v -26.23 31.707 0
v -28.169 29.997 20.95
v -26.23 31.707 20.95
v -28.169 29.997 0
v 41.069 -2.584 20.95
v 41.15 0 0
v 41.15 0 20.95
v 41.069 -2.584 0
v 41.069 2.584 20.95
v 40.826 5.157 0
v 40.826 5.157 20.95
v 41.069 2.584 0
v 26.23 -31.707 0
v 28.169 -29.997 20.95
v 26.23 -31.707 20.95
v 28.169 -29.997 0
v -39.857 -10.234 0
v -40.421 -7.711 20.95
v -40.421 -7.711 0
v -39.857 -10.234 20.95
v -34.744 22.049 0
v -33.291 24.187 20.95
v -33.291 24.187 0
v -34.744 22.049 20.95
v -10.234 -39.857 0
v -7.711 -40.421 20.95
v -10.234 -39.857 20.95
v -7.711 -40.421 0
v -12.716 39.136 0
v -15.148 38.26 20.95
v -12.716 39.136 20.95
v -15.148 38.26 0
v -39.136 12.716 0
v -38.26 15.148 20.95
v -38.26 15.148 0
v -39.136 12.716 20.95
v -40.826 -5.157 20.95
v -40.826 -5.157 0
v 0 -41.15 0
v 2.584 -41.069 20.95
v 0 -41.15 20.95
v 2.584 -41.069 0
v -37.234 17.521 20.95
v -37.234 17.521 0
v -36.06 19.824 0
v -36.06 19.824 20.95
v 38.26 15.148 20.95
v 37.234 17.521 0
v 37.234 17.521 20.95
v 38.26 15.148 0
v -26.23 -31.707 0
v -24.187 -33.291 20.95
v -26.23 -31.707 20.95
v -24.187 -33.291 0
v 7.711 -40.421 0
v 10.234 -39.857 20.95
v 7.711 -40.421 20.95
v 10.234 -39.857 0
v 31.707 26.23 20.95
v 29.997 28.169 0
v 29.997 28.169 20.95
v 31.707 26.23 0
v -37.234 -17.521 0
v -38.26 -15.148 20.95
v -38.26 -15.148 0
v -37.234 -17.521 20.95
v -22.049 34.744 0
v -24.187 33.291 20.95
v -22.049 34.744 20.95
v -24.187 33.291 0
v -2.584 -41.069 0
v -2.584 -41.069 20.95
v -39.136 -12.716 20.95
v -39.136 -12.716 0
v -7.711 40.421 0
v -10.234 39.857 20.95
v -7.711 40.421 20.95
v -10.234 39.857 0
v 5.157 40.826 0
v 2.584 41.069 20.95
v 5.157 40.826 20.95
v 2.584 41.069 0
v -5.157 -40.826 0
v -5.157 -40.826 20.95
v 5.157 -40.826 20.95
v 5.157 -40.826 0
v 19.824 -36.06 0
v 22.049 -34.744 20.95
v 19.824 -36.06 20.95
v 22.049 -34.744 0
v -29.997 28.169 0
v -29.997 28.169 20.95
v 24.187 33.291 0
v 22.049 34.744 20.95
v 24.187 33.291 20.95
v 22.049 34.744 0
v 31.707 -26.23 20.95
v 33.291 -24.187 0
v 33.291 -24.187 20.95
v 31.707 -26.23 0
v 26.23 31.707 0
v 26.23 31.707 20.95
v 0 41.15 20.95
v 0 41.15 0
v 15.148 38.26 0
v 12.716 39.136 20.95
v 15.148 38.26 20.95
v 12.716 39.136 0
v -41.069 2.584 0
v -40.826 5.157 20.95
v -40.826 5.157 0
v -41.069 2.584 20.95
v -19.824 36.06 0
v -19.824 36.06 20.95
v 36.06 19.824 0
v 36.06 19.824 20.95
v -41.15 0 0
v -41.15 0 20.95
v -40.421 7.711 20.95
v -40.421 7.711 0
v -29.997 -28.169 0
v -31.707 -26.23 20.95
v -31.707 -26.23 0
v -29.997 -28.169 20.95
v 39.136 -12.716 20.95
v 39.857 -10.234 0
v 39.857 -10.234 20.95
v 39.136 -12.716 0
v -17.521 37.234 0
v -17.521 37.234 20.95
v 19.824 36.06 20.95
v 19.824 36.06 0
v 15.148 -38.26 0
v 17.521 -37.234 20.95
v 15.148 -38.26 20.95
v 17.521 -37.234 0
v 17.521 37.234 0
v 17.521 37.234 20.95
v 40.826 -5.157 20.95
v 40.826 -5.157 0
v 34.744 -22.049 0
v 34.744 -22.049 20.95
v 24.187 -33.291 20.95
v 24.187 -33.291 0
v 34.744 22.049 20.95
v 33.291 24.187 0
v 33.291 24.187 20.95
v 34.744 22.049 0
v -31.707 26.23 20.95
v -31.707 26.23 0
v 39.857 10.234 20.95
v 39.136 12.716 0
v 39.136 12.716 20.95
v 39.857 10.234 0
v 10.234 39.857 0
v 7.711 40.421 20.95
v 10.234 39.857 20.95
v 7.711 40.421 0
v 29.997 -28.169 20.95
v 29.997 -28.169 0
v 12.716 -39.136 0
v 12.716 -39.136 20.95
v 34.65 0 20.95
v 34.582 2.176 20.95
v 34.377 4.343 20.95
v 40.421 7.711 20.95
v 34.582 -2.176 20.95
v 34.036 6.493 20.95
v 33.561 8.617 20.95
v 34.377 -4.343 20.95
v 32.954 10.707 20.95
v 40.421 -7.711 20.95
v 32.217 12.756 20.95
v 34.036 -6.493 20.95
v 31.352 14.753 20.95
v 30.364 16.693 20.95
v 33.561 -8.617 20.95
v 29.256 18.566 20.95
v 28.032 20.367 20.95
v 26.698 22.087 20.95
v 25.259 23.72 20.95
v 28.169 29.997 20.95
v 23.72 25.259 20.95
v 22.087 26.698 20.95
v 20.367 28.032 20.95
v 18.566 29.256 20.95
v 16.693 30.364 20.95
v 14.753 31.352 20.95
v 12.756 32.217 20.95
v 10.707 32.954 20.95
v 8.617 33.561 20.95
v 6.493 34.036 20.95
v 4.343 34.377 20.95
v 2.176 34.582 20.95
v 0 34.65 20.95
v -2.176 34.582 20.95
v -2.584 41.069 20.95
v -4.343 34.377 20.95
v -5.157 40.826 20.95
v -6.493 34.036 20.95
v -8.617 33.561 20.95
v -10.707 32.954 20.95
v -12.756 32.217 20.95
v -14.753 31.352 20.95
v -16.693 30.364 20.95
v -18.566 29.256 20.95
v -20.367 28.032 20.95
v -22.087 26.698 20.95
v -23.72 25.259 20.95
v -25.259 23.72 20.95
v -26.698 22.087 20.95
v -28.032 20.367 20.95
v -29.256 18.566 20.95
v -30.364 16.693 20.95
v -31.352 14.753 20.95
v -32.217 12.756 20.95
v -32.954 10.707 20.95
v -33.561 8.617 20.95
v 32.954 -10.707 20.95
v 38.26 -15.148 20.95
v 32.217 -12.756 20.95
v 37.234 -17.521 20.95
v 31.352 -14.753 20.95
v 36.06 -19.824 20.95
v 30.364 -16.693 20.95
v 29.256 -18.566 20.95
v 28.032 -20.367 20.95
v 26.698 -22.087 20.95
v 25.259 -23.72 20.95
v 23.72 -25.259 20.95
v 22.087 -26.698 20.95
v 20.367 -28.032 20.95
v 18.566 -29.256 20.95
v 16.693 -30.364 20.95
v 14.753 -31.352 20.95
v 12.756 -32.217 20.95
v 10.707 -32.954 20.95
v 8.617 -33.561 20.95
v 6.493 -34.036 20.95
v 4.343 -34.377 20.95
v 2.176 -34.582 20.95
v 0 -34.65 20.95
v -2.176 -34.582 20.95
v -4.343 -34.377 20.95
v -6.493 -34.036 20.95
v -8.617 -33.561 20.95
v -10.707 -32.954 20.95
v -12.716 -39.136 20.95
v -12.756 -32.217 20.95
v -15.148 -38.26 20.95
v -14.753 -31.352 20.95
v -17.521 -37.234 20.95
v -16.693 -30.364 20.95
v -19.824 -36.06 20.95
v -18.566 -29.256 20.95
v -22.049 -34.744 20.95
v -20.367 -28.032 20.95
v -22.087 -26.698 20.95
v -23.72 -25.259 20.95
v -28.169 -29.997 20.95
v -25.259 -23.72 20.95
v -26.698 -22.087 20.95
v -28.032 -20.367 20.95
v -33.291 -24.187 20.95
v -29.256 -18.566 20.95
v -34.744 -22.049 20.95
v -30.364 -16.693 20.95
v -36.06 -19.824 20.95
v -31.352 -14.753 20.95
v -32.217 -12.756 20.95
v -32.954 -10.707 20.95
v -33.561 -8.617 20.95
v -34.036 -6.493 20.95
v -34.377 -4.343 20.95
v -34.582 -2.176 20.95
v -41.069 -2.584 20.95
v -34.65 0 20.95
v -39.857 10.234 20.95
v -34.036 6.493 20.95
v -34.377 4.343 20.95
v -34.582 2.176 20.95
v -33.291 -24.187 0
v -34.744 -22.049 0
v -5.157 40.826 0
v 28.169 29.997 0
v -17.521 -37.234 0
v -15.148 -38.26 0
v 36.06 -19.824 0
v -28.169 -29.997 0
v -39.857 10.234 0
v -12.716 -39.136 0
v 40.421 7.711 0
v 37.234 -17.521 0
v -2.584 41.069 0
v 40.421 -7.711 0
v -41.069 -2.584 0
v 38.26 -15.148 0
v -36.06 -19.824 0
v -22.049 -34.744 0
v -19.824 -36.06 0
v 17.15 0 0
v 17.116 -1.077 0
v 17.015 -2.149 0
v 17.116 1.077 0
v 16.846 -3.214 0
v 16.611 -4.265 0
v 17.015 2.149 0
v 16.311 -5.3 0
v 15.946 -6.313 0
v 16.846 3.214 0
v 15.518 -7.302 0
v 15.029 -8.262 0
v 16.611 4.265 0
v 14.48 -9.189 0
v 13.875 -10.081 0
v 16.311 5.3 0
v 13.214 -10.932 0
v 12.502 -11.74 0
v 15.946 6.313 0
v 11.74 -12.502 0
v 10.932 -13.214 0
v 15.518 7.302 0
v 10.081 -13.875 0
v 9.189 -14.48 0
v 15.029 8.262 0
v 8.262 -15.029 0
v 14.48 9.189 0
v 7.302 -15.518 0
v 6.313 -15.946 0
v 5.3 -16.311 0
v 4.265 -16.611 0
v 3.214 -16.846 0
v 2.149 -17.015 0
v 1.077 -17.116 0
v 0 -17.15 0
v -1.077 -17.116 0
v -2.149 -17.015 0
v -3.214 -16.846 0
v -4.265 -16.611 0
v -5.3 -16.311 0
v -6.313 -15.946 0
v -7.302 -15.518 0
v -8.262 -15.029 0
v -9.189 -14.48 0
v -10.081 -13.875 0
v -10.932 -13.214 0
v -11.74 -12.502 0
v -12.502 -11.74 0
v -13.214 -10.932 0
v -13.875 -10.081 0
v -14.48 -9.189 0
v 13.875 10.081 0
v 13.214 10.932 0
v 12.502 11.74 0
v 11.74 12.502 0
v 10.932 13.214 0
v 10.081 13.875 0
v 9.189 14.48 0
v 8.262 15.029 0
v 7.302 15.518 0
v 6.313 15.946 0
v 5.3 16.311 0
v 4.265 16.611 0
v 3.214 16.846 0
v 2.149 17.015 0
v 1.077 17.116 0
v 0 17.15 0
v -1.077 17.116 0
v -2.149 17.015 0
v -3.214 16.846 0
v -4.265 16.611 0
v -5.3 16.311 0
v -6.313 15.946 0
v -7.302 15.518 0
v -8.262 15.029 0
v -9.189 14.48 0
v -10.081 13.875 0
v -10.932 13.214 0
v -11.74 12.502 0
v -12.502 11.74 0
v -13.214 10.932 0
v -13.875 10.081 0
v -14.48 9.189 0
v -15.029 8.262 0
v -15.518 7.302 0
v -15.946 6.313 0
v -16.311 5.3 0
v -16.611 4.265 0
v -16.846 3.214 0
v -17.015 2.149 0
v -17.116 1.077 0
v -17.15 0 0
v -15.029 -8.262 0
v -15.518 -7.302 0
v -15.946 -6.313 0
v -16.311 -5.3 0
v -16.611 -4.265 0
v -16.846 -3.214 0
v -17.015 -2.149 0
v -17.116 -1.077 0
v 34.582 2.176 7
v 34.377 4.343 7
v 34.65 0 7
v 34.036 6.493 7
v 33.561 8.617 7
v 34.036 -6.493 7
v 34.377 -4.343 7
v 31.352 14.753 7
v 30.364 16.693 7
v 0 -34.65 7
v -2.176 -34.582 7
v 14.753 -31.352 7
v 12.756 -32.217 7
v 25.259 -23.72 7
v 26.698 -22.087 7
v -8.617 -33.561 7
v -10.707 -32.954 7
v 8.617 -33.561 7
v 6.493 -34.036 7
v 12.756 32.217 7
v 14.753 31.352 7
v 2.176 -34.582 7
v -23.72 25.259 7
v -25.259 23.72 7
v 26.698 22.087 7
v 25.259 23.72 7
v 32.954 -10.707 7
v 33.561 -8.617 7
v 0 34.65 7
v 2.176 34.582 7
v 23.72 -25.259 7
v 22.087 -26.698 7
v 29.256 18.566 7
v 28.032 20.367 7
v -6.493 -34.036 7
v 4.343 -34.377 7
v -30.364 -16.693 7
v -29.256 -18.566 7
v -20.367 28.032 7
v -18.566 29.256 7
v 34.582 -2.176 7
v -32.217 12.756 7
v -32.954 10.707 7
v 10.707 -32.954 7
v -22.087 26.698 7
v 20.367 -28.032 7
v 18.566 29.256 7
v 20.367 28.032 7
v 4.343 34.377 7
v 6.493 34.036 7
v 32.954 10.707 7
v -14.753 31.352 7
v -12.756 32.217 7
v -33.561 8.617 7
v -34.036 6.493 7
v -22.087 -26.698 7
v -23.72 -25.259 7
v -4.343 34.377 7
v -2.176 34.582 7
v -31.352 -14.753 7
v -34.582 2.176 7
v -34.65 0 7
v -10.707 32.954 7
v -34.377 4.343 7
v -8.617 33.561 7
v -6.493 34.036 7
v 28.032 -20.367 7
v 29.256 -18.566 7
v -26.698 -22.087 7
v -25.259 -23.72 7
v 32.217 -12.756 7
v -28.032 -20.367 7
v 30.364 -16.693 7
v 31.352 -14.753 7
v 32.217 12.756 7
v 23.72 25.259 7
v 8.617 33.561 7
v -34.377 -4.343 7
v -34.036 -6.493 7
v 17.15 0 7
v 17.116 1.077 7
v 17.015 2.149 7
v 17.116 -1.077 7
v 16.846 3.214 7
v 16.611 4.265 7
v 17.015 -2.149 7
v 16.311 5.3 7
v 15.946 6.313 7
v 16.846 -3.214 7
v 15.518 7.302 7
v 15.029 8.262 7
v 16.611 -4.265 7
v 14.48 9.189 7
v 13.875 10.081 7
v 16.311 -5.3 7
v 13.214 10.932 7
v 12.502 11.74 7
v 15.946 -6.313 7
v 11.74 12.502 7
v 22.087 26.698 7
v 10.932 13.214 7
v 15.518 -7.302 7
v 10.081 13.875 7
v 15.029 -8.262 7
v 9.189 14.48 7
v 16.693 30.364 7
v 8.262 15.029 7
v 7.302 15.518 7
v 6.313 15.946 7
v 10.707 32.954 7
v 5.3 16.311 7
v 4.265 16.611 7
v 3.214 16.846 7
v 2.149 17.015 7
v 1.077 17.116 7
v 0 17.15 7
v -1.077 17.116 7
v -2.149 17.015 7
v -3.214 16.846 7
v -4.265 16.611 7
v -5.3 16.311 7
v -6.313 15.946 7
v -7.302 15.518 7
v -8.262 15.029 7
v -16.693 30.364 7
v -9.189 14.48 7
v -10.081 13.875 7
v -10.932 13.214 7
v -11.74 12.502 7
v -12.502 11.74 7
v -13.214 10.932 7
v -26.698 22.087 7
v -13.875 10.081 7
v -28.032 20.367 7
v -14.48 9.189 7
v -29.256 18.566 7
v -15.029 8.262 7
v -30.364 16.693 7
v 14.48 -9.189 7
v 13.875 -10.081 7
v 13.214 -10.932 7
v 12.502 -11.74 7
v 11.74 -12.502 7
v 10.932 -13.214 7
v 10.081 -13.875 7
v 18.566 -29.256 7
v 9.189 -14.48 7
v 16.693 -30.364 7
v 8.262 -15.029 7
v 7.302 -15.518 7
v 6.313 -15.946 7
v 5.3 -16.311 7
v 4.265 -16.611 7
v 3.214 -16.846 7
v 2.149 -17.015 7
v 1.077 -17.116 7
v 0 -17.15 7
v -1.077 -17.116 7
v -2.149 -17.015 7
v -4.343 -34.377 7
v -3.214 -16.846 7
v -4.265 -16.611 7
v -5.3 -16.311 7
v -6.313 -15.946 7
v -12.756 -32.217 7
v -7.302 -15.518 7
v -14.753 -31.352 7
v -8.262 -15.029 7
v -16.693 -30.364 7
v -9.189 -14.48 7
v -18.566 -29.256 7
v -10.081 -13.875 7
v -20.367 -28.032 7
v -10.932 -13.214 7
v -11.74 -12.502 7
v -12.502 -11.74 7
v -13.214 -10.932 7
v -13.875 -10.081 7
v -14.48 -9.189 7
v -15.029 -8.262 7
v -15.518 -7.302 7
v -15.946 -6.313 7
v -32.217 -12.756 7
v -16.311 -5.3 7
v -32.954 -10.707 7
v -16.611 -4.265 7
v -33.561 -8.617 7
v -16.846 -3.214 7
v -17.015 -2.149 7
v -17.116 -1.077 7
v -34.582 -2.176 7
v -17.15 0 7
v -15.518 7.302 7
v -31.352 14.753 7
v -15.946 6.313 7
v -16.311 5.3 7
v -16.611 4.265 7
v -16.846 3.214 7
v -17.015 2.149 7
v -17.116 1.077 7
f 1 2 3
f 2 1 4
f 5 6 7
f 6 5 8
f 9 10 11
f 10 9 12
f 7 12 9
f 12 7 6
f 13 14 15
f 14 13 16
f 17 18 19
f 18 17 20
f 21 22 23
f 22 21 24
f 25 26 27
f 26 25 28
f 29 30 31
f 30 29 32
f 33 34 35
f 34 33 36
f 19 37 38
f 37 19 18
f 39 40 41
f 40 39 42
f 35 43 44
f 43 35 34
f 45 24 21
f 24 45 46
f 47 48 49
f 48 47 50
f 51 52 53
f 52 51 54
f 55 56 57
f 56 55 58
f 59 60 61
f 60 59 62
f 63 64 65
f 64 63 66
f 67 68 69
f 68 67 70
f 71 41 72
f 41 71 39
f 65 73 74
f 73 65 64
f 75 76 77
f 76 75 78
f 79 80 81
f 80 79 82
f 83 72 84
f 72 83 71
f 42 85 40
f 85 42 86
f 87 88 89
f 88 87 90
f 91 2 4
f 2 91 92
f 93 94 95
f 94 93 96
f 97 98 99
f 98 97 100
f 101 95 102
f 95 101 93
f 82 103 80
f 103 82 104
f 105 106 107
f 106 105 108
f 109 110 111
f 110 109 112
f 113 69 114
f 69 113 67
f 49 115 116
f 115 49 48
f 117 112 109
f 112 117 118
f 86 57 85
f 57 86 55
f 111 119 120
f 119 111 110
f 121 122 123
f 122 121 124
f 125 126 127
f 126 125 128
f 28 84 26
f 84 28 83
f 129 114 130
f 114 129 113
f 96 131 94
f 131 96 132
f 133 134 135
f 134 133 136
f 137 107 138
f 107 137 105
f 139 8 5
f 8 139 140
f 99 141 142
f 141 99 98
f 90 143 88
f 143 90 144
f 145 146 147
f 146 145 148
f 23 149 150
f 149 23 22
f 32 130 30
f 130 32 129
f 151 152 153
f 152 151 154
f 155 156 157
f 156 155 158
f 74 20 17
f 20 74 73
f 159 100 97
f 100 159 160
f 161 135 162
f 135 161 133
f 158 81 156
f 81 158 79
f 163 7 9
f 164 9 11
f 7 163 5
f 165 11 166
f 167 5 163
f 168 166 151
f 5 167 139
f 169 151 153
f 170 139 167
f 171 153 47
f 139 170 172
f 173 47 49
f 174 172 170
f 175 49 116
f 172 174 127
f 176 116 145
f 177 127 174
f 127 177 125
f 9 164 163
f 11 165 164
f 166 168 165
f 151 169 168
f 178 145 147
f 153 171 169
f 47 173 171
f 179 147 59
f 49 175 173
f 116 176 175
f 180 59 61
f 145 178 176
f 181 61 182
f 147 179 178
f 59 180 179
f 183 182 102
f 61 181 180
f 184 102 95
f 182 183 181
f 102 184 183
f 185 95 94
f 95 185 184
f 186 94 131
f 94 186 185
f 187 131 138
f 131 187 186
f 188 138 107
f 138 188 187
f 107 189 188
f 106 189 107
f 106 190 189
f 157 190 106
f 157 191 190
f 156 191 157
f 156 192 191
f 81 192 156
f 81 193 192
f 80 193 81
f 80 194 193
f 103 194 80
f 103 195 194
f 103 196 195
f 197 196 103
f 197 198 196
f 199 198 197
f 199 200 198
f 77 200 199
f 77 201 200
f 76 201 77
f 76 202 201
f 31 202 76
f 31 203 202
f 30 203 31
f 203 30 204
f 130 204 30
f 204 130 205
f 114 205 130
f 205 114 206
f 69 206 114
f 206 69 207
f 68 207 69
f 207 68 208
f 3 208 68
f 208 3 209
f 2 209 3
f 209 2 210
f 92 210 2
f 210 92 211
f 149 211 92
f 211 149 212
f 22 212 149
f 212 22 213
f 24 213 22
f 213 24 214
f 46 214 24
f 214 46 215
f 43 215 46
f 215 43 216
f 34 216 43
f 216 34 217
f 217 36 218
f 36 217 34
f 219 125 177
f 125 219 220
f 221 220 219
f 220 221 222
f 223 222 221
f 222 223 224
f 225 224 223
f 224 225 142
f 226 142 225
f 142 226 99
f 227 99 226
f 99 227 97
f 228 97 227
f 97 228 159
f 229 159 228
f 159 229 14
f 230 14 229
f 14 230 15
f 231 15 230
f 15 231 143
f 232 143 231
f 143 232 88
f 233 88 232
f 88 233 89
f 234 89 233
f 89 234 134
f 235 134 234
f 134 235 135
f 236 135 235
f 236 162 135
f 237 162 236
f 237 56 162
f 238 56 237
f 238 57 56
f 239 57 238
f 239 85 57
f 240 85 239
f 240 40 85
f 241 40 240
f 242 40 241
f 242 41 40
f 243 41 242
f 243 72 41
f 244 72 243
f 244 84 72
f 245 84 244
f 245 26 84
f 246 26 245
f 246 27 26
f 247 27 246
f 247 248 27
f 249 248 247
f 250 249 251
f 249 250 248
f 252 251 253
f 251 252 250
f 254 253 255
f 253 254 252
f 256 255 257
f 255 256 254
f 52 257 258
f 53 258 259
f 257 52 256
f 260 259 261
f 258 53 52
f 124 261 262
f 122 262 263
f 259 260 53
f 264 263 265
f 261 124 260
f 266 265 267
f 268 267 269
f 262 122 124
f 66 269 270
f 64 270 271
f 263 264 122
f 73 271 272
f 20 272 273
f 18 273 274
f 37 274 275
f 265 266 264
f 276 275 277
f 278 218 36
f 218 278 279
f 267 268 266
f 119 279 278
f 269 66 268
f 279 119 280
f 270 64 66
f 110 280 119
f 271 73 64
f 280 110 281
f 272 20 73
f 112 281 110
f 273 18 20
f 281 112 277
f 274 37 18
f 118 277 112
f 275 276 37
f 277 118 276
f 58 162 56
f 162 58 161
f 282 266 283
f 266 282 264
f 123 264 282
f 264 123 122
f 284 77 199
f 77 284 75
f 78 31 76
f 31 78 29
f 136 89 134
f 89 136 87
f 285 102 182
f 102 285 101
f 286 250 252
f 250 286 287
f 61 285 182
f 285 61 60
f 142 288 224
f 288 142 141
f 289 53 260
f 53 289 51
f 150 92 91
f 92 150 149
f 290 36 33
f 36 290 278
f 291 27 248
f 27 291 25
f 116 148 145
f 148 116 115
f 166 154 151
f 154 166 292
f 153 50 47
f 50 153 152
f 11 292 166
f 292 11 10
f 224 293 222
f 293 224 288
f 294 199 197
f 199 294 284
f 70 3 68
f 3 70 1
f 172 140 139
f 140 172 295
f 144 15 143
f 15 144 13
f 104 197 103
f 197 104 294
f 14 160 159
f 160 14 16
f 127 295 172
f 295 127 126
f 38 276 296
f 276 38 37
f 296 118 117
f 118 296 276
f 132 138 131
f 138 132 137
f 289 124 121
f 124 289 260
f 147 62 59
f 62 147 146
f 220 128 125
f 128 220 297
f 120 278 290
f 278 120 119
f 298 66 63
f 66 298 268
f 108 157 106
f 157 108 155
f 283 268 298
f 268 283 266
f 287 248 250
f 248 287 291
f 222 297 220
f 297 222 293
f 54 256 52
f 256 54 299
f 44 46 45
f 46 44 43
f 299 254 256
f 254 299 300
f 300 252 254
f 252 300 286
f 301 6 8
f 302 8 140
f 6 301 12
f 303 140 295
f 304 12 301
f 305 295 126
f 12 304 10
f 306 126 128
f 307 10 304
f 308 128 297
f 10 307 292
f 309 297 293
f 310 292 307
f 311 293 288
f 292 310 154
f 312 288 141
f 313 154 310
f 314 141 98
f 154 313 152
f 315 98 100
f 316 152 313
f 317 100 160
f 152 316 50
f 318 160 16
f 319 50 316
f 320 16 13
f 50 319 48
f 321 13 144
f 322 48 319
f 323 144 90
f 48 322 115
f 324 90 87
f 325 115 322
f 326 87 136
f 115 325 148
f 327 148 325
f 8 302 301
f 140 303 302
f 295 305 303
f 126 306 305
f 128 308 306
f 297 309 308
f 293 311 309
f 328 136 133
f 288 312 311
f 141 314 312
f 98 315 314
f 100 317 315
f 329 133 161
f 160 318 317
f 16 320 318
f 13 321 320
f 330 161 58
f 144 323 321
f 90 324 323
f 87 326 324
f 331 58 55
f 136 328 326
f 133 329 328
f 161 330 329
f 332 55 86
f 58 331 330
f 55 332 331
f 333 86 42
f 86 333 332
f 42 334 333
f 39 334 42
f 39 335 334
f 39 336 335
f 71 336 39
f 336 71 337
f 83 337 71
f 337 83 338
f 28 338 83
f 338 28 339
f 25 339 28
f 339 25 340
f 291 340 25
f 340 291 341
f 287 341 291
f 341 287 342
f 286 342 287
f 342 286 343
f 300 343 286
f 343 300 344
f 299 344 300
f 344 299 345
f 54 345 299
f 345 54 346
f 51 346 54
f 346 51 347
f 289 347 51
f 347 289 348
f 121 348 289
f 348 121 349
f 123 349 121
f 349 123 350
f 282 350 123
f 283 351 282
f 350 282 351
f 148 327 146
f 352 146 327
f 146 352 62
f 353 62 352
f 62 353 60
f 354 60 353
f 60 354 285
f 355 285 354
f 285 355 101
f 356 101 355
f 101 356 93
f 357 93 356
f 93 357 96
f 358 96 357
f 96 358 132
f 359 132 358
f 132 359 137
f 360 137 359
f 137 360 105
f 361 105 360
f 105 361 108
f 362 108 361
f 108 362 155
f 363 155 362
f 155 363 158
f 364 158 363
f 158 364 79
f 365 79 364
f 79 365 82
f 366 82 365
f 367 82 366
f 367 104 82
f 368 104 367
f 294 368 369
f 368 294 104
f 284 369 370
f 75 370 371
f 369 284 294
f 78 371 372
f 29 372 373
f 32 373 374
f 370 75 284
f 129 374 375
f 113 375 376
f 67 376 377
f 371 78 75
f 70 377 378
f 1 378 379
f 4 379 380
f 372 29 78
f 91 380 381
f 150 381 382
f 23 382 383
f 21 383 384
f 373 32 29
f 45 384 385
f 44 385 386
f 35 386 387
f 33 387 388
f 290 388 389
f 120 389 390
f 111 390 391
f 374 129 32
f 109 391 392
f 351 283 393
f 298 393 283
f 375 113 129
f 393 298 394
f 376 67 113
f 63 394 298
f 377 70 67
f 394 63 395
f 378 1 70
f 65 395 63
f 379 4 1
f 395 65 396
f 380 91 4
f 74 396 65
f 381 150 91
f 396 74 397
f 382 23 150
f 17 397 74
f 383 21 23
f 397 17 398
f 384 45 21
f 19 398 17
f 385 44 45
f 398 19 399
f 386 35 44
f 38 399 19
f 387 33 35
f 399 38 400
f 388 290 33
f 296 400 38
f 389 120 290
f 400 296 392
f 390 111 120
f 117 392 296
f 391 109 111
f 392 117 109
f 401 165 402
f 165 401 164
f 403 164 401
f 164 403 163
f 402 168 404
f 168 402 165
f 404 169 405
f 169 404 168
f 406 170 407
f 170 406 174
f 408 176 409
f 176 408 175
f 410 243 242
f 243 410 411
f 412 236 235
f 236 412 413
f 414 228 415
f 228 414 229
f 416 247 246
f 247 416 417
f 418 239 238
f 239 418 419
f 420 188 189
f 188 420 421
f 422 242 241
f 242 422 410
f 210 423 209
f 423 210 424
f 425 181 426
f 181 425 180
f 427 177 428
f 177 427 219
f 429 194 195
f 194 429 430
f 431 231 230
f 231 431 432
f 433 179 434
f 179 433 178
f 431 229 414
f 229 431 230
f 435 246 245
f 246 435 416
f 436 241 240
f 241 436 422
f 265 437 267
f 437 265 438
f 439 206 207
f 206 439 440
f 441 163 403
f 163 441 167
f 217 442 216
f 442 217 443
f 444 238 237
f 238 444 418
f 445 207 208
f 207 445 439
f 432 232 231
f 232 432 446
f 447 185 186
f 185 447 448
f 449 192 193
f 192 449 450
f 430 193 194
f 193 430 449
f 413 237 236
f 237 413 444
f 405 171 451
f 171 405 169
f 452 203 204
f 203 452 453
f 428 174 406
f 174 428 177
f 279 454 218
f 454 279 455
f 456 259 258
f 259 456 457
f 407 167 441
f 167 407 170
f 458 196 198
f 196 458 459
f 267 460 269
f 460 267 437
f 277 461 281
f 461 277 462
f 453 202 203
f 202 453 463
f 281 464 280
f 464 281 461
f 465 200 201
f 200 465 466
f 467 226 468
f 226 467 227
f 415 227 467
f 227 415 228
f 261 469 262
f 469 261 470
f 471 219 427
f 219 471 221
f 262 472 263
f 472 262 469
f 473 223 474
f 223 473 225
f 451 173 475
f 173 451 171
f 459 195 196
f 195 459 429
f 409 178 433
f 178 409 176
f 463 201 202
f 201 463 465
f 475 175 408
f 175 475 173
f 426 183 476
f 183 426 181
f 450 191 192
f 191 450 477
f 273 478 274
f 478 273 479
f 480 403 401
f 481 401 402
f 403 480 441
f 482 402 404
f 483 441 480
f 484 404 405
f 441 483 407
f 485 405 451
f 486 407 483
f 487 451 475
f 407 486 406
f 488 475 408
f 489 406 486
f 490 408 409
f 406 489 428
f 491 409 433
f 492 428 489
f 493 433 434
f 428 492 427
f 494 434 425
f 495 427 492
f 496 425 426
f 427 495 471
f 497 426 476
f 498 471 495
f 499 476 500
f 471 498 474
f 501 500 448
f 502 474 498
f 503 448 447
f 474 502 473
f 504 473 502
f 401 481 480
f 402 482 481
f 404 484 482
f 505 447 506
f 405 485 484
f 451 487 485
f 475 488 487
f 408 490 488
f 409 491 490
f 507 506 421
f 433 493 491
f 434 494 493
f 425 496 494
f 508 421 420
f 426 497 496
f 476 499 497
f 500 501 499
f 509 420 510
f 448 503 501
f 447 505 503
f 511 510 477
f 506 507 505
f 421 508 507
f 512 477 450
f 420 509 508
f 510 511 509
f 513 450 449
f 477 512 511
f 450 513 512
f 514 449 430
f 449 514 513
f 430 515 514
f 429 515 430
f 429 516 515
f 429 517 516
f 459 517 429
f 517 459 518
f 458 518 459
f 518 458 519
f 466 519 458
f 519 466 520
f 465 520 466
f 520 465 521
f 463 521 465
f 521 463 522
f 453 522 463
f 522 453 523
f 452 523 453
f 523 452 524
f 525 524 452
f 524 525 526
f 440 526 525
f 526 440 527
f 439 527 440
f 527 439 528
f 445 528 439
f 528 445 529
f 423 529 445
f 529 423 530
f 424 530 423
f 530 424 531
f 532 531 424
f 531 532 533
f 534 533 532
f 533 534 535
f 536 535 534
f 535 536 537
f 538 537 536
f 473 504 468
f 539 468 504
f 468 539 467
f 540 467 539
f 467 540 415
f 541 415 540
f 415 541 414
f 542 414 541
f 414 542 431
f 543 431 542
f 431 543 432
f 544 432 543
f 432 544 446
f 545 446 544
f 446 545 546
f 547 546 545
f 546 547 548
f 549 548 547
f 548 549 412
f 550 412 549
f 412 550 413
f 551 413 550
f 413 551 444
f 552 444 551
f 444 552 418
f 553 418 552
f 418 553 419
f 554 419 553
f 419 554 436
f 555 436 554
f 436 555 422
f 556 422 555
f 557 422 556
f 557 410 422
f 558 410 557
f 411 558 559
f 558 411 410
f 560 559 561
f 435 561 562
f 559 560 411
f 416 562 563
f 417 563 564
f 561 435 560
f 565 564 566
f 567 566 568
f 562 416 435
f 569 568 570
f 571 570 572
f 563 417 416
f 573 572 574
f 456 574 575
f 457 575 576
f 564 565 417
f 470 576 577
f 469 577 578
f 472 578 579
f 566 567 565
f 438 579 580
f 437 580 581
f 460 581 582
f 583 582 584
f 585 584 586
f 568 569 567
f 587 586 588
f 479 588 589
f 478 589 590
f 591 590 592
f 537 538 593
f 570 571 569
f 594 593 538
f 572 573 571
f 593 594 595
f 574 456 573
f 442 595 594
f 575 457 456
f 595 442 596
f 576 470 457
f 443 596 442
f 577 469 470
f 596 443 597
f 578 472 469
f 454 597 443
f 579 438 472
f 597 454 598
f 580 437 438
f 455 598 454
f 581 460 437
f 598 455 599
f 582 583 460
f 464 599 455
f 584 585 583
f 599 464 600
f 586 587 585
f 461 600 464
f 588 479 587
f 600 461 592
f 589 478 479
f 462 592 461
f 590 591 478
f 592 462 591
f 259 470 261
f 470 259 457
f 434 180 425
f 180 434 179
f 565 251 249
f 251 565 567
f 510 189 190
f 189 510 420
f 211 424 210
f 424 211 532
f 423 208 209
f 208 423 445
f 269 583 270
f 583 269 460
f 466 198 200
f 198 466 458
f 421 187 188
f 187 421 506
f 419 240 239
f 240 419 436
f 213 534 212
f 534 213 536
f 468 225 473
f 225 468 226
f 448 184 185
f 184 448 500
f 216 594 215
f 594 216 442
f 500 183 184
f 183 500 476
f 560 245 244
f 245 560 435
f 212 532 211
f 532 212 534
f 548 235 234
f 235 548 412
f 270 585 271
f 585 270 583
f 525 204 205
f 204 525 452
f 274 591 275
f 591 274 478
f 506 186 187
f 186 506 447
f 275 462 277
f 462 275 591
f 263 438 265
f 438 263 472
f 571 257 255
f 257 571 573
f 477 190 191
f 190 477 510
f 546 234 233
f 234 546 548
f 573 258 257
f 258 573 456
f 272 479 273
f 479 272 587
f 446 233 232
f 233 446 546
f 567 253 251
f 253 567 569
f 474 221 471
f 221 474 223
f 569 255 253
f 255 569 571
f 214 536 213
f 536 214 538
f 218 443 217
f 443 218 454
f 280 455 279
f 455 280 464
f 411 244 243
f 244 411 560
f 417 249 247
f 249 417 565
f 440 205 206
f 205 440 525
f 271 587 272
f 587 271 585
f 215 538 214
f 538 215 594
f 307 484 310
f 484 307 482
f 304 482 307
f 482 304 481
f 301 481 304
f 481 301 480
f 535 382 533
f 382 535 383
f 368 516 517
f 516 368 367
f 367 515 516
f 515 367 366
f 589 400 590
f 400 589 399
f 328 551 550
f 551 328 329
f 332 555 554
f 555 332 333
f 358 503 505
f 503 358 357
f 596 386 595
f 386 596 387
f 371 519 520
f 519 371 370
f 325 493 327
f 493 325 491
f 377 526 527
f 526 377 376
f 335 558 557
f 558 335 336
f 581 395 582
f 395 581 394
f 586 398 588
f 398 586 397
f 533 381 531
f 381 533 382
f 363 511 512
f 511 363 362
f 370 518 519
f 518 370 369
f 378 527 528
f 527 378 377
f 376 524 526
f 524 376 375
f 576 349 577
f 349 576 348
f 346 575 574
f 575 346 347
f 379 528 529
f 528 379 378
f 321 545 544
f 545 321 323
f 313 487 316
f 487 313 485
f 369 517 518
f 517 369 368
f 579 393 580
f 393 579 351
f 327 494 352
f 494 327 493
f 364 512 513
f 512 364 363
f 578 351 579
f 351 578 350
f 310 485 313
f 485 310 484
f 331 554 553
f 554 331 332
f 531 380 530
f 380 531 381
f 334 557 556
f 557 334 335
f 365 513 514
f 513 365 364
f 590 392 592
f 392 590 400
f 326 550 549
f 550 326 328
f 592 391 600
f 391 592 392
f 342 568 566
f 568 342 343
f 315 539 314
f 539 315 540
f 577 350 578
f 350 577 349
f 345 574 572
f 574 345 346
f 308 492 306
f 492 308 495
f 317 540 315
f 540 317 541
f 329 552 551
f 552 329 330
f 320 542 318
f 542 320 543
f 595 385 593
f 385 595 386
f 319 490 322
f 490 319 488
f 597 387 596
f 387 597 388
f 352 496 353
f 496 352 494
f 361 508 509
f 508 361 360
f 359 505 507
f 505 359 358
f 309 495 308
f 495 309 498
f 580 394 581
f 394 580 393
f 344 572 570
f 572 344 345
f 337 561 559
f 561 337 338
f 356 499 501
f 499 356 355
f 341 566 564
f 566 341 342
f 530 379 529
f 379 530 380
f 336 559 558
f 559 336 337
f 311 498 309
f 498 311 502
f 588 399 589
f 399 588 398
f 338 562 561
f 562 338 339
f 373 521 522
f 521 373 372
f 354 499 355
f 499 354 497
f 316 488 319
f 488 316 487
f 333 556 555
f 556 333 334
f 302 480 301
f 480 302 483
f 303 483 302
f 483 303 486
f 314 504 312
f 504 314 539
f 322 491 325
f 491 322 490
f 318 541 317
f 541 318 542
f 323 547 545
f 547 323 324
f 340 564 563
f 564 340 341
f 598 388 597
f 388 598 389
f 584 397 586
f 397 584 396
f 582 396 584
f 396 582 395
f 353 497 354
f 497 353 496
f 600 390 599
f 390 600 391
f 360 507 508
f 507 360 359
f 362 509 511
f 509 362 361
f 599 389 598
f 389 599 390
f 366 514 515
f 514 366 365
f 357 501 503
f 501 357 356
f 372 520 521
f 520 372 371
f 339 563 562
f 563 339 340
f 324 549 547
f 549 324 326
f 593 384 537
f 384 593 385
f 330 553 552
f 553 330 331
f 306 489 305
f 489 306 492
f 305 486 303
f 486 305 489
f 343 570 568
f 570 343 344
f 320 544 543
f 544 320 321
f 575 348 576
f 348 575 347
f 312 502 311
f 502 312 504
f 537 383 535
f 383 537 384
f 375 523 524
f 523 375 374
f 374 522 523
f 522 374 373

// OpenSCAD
$fn = 100;

MAGIC = 0.01;
LOOSEN_BY = 1;
PUCK_DIAM = 68.3;
PUCK_THICK = 18.6;

wallThick = 7;
puckHeightCoverage = .75;
accessHoleEdgeWidth = 17;

difference() {

  // Main body:
  cylinder(h = PUCK_THICK * puckHeightCoverage + wallThick, d = PUCK_DIAM + wallThick * 2);

  // Carve out hole for puck:
  translate([ 0, 0, wallThick ])
  cylinder(h = PUCK_THICK, d = PUCK_DIAM + LOOSEN_BY);

  // Carve out access hole:
  translate([ 0, 0, -MAGIC ])
  cylinder(h = wallThick + MAGIC * 2, d = PUCK_DIAM - accessHoleEdgeWidth * 2);

}
